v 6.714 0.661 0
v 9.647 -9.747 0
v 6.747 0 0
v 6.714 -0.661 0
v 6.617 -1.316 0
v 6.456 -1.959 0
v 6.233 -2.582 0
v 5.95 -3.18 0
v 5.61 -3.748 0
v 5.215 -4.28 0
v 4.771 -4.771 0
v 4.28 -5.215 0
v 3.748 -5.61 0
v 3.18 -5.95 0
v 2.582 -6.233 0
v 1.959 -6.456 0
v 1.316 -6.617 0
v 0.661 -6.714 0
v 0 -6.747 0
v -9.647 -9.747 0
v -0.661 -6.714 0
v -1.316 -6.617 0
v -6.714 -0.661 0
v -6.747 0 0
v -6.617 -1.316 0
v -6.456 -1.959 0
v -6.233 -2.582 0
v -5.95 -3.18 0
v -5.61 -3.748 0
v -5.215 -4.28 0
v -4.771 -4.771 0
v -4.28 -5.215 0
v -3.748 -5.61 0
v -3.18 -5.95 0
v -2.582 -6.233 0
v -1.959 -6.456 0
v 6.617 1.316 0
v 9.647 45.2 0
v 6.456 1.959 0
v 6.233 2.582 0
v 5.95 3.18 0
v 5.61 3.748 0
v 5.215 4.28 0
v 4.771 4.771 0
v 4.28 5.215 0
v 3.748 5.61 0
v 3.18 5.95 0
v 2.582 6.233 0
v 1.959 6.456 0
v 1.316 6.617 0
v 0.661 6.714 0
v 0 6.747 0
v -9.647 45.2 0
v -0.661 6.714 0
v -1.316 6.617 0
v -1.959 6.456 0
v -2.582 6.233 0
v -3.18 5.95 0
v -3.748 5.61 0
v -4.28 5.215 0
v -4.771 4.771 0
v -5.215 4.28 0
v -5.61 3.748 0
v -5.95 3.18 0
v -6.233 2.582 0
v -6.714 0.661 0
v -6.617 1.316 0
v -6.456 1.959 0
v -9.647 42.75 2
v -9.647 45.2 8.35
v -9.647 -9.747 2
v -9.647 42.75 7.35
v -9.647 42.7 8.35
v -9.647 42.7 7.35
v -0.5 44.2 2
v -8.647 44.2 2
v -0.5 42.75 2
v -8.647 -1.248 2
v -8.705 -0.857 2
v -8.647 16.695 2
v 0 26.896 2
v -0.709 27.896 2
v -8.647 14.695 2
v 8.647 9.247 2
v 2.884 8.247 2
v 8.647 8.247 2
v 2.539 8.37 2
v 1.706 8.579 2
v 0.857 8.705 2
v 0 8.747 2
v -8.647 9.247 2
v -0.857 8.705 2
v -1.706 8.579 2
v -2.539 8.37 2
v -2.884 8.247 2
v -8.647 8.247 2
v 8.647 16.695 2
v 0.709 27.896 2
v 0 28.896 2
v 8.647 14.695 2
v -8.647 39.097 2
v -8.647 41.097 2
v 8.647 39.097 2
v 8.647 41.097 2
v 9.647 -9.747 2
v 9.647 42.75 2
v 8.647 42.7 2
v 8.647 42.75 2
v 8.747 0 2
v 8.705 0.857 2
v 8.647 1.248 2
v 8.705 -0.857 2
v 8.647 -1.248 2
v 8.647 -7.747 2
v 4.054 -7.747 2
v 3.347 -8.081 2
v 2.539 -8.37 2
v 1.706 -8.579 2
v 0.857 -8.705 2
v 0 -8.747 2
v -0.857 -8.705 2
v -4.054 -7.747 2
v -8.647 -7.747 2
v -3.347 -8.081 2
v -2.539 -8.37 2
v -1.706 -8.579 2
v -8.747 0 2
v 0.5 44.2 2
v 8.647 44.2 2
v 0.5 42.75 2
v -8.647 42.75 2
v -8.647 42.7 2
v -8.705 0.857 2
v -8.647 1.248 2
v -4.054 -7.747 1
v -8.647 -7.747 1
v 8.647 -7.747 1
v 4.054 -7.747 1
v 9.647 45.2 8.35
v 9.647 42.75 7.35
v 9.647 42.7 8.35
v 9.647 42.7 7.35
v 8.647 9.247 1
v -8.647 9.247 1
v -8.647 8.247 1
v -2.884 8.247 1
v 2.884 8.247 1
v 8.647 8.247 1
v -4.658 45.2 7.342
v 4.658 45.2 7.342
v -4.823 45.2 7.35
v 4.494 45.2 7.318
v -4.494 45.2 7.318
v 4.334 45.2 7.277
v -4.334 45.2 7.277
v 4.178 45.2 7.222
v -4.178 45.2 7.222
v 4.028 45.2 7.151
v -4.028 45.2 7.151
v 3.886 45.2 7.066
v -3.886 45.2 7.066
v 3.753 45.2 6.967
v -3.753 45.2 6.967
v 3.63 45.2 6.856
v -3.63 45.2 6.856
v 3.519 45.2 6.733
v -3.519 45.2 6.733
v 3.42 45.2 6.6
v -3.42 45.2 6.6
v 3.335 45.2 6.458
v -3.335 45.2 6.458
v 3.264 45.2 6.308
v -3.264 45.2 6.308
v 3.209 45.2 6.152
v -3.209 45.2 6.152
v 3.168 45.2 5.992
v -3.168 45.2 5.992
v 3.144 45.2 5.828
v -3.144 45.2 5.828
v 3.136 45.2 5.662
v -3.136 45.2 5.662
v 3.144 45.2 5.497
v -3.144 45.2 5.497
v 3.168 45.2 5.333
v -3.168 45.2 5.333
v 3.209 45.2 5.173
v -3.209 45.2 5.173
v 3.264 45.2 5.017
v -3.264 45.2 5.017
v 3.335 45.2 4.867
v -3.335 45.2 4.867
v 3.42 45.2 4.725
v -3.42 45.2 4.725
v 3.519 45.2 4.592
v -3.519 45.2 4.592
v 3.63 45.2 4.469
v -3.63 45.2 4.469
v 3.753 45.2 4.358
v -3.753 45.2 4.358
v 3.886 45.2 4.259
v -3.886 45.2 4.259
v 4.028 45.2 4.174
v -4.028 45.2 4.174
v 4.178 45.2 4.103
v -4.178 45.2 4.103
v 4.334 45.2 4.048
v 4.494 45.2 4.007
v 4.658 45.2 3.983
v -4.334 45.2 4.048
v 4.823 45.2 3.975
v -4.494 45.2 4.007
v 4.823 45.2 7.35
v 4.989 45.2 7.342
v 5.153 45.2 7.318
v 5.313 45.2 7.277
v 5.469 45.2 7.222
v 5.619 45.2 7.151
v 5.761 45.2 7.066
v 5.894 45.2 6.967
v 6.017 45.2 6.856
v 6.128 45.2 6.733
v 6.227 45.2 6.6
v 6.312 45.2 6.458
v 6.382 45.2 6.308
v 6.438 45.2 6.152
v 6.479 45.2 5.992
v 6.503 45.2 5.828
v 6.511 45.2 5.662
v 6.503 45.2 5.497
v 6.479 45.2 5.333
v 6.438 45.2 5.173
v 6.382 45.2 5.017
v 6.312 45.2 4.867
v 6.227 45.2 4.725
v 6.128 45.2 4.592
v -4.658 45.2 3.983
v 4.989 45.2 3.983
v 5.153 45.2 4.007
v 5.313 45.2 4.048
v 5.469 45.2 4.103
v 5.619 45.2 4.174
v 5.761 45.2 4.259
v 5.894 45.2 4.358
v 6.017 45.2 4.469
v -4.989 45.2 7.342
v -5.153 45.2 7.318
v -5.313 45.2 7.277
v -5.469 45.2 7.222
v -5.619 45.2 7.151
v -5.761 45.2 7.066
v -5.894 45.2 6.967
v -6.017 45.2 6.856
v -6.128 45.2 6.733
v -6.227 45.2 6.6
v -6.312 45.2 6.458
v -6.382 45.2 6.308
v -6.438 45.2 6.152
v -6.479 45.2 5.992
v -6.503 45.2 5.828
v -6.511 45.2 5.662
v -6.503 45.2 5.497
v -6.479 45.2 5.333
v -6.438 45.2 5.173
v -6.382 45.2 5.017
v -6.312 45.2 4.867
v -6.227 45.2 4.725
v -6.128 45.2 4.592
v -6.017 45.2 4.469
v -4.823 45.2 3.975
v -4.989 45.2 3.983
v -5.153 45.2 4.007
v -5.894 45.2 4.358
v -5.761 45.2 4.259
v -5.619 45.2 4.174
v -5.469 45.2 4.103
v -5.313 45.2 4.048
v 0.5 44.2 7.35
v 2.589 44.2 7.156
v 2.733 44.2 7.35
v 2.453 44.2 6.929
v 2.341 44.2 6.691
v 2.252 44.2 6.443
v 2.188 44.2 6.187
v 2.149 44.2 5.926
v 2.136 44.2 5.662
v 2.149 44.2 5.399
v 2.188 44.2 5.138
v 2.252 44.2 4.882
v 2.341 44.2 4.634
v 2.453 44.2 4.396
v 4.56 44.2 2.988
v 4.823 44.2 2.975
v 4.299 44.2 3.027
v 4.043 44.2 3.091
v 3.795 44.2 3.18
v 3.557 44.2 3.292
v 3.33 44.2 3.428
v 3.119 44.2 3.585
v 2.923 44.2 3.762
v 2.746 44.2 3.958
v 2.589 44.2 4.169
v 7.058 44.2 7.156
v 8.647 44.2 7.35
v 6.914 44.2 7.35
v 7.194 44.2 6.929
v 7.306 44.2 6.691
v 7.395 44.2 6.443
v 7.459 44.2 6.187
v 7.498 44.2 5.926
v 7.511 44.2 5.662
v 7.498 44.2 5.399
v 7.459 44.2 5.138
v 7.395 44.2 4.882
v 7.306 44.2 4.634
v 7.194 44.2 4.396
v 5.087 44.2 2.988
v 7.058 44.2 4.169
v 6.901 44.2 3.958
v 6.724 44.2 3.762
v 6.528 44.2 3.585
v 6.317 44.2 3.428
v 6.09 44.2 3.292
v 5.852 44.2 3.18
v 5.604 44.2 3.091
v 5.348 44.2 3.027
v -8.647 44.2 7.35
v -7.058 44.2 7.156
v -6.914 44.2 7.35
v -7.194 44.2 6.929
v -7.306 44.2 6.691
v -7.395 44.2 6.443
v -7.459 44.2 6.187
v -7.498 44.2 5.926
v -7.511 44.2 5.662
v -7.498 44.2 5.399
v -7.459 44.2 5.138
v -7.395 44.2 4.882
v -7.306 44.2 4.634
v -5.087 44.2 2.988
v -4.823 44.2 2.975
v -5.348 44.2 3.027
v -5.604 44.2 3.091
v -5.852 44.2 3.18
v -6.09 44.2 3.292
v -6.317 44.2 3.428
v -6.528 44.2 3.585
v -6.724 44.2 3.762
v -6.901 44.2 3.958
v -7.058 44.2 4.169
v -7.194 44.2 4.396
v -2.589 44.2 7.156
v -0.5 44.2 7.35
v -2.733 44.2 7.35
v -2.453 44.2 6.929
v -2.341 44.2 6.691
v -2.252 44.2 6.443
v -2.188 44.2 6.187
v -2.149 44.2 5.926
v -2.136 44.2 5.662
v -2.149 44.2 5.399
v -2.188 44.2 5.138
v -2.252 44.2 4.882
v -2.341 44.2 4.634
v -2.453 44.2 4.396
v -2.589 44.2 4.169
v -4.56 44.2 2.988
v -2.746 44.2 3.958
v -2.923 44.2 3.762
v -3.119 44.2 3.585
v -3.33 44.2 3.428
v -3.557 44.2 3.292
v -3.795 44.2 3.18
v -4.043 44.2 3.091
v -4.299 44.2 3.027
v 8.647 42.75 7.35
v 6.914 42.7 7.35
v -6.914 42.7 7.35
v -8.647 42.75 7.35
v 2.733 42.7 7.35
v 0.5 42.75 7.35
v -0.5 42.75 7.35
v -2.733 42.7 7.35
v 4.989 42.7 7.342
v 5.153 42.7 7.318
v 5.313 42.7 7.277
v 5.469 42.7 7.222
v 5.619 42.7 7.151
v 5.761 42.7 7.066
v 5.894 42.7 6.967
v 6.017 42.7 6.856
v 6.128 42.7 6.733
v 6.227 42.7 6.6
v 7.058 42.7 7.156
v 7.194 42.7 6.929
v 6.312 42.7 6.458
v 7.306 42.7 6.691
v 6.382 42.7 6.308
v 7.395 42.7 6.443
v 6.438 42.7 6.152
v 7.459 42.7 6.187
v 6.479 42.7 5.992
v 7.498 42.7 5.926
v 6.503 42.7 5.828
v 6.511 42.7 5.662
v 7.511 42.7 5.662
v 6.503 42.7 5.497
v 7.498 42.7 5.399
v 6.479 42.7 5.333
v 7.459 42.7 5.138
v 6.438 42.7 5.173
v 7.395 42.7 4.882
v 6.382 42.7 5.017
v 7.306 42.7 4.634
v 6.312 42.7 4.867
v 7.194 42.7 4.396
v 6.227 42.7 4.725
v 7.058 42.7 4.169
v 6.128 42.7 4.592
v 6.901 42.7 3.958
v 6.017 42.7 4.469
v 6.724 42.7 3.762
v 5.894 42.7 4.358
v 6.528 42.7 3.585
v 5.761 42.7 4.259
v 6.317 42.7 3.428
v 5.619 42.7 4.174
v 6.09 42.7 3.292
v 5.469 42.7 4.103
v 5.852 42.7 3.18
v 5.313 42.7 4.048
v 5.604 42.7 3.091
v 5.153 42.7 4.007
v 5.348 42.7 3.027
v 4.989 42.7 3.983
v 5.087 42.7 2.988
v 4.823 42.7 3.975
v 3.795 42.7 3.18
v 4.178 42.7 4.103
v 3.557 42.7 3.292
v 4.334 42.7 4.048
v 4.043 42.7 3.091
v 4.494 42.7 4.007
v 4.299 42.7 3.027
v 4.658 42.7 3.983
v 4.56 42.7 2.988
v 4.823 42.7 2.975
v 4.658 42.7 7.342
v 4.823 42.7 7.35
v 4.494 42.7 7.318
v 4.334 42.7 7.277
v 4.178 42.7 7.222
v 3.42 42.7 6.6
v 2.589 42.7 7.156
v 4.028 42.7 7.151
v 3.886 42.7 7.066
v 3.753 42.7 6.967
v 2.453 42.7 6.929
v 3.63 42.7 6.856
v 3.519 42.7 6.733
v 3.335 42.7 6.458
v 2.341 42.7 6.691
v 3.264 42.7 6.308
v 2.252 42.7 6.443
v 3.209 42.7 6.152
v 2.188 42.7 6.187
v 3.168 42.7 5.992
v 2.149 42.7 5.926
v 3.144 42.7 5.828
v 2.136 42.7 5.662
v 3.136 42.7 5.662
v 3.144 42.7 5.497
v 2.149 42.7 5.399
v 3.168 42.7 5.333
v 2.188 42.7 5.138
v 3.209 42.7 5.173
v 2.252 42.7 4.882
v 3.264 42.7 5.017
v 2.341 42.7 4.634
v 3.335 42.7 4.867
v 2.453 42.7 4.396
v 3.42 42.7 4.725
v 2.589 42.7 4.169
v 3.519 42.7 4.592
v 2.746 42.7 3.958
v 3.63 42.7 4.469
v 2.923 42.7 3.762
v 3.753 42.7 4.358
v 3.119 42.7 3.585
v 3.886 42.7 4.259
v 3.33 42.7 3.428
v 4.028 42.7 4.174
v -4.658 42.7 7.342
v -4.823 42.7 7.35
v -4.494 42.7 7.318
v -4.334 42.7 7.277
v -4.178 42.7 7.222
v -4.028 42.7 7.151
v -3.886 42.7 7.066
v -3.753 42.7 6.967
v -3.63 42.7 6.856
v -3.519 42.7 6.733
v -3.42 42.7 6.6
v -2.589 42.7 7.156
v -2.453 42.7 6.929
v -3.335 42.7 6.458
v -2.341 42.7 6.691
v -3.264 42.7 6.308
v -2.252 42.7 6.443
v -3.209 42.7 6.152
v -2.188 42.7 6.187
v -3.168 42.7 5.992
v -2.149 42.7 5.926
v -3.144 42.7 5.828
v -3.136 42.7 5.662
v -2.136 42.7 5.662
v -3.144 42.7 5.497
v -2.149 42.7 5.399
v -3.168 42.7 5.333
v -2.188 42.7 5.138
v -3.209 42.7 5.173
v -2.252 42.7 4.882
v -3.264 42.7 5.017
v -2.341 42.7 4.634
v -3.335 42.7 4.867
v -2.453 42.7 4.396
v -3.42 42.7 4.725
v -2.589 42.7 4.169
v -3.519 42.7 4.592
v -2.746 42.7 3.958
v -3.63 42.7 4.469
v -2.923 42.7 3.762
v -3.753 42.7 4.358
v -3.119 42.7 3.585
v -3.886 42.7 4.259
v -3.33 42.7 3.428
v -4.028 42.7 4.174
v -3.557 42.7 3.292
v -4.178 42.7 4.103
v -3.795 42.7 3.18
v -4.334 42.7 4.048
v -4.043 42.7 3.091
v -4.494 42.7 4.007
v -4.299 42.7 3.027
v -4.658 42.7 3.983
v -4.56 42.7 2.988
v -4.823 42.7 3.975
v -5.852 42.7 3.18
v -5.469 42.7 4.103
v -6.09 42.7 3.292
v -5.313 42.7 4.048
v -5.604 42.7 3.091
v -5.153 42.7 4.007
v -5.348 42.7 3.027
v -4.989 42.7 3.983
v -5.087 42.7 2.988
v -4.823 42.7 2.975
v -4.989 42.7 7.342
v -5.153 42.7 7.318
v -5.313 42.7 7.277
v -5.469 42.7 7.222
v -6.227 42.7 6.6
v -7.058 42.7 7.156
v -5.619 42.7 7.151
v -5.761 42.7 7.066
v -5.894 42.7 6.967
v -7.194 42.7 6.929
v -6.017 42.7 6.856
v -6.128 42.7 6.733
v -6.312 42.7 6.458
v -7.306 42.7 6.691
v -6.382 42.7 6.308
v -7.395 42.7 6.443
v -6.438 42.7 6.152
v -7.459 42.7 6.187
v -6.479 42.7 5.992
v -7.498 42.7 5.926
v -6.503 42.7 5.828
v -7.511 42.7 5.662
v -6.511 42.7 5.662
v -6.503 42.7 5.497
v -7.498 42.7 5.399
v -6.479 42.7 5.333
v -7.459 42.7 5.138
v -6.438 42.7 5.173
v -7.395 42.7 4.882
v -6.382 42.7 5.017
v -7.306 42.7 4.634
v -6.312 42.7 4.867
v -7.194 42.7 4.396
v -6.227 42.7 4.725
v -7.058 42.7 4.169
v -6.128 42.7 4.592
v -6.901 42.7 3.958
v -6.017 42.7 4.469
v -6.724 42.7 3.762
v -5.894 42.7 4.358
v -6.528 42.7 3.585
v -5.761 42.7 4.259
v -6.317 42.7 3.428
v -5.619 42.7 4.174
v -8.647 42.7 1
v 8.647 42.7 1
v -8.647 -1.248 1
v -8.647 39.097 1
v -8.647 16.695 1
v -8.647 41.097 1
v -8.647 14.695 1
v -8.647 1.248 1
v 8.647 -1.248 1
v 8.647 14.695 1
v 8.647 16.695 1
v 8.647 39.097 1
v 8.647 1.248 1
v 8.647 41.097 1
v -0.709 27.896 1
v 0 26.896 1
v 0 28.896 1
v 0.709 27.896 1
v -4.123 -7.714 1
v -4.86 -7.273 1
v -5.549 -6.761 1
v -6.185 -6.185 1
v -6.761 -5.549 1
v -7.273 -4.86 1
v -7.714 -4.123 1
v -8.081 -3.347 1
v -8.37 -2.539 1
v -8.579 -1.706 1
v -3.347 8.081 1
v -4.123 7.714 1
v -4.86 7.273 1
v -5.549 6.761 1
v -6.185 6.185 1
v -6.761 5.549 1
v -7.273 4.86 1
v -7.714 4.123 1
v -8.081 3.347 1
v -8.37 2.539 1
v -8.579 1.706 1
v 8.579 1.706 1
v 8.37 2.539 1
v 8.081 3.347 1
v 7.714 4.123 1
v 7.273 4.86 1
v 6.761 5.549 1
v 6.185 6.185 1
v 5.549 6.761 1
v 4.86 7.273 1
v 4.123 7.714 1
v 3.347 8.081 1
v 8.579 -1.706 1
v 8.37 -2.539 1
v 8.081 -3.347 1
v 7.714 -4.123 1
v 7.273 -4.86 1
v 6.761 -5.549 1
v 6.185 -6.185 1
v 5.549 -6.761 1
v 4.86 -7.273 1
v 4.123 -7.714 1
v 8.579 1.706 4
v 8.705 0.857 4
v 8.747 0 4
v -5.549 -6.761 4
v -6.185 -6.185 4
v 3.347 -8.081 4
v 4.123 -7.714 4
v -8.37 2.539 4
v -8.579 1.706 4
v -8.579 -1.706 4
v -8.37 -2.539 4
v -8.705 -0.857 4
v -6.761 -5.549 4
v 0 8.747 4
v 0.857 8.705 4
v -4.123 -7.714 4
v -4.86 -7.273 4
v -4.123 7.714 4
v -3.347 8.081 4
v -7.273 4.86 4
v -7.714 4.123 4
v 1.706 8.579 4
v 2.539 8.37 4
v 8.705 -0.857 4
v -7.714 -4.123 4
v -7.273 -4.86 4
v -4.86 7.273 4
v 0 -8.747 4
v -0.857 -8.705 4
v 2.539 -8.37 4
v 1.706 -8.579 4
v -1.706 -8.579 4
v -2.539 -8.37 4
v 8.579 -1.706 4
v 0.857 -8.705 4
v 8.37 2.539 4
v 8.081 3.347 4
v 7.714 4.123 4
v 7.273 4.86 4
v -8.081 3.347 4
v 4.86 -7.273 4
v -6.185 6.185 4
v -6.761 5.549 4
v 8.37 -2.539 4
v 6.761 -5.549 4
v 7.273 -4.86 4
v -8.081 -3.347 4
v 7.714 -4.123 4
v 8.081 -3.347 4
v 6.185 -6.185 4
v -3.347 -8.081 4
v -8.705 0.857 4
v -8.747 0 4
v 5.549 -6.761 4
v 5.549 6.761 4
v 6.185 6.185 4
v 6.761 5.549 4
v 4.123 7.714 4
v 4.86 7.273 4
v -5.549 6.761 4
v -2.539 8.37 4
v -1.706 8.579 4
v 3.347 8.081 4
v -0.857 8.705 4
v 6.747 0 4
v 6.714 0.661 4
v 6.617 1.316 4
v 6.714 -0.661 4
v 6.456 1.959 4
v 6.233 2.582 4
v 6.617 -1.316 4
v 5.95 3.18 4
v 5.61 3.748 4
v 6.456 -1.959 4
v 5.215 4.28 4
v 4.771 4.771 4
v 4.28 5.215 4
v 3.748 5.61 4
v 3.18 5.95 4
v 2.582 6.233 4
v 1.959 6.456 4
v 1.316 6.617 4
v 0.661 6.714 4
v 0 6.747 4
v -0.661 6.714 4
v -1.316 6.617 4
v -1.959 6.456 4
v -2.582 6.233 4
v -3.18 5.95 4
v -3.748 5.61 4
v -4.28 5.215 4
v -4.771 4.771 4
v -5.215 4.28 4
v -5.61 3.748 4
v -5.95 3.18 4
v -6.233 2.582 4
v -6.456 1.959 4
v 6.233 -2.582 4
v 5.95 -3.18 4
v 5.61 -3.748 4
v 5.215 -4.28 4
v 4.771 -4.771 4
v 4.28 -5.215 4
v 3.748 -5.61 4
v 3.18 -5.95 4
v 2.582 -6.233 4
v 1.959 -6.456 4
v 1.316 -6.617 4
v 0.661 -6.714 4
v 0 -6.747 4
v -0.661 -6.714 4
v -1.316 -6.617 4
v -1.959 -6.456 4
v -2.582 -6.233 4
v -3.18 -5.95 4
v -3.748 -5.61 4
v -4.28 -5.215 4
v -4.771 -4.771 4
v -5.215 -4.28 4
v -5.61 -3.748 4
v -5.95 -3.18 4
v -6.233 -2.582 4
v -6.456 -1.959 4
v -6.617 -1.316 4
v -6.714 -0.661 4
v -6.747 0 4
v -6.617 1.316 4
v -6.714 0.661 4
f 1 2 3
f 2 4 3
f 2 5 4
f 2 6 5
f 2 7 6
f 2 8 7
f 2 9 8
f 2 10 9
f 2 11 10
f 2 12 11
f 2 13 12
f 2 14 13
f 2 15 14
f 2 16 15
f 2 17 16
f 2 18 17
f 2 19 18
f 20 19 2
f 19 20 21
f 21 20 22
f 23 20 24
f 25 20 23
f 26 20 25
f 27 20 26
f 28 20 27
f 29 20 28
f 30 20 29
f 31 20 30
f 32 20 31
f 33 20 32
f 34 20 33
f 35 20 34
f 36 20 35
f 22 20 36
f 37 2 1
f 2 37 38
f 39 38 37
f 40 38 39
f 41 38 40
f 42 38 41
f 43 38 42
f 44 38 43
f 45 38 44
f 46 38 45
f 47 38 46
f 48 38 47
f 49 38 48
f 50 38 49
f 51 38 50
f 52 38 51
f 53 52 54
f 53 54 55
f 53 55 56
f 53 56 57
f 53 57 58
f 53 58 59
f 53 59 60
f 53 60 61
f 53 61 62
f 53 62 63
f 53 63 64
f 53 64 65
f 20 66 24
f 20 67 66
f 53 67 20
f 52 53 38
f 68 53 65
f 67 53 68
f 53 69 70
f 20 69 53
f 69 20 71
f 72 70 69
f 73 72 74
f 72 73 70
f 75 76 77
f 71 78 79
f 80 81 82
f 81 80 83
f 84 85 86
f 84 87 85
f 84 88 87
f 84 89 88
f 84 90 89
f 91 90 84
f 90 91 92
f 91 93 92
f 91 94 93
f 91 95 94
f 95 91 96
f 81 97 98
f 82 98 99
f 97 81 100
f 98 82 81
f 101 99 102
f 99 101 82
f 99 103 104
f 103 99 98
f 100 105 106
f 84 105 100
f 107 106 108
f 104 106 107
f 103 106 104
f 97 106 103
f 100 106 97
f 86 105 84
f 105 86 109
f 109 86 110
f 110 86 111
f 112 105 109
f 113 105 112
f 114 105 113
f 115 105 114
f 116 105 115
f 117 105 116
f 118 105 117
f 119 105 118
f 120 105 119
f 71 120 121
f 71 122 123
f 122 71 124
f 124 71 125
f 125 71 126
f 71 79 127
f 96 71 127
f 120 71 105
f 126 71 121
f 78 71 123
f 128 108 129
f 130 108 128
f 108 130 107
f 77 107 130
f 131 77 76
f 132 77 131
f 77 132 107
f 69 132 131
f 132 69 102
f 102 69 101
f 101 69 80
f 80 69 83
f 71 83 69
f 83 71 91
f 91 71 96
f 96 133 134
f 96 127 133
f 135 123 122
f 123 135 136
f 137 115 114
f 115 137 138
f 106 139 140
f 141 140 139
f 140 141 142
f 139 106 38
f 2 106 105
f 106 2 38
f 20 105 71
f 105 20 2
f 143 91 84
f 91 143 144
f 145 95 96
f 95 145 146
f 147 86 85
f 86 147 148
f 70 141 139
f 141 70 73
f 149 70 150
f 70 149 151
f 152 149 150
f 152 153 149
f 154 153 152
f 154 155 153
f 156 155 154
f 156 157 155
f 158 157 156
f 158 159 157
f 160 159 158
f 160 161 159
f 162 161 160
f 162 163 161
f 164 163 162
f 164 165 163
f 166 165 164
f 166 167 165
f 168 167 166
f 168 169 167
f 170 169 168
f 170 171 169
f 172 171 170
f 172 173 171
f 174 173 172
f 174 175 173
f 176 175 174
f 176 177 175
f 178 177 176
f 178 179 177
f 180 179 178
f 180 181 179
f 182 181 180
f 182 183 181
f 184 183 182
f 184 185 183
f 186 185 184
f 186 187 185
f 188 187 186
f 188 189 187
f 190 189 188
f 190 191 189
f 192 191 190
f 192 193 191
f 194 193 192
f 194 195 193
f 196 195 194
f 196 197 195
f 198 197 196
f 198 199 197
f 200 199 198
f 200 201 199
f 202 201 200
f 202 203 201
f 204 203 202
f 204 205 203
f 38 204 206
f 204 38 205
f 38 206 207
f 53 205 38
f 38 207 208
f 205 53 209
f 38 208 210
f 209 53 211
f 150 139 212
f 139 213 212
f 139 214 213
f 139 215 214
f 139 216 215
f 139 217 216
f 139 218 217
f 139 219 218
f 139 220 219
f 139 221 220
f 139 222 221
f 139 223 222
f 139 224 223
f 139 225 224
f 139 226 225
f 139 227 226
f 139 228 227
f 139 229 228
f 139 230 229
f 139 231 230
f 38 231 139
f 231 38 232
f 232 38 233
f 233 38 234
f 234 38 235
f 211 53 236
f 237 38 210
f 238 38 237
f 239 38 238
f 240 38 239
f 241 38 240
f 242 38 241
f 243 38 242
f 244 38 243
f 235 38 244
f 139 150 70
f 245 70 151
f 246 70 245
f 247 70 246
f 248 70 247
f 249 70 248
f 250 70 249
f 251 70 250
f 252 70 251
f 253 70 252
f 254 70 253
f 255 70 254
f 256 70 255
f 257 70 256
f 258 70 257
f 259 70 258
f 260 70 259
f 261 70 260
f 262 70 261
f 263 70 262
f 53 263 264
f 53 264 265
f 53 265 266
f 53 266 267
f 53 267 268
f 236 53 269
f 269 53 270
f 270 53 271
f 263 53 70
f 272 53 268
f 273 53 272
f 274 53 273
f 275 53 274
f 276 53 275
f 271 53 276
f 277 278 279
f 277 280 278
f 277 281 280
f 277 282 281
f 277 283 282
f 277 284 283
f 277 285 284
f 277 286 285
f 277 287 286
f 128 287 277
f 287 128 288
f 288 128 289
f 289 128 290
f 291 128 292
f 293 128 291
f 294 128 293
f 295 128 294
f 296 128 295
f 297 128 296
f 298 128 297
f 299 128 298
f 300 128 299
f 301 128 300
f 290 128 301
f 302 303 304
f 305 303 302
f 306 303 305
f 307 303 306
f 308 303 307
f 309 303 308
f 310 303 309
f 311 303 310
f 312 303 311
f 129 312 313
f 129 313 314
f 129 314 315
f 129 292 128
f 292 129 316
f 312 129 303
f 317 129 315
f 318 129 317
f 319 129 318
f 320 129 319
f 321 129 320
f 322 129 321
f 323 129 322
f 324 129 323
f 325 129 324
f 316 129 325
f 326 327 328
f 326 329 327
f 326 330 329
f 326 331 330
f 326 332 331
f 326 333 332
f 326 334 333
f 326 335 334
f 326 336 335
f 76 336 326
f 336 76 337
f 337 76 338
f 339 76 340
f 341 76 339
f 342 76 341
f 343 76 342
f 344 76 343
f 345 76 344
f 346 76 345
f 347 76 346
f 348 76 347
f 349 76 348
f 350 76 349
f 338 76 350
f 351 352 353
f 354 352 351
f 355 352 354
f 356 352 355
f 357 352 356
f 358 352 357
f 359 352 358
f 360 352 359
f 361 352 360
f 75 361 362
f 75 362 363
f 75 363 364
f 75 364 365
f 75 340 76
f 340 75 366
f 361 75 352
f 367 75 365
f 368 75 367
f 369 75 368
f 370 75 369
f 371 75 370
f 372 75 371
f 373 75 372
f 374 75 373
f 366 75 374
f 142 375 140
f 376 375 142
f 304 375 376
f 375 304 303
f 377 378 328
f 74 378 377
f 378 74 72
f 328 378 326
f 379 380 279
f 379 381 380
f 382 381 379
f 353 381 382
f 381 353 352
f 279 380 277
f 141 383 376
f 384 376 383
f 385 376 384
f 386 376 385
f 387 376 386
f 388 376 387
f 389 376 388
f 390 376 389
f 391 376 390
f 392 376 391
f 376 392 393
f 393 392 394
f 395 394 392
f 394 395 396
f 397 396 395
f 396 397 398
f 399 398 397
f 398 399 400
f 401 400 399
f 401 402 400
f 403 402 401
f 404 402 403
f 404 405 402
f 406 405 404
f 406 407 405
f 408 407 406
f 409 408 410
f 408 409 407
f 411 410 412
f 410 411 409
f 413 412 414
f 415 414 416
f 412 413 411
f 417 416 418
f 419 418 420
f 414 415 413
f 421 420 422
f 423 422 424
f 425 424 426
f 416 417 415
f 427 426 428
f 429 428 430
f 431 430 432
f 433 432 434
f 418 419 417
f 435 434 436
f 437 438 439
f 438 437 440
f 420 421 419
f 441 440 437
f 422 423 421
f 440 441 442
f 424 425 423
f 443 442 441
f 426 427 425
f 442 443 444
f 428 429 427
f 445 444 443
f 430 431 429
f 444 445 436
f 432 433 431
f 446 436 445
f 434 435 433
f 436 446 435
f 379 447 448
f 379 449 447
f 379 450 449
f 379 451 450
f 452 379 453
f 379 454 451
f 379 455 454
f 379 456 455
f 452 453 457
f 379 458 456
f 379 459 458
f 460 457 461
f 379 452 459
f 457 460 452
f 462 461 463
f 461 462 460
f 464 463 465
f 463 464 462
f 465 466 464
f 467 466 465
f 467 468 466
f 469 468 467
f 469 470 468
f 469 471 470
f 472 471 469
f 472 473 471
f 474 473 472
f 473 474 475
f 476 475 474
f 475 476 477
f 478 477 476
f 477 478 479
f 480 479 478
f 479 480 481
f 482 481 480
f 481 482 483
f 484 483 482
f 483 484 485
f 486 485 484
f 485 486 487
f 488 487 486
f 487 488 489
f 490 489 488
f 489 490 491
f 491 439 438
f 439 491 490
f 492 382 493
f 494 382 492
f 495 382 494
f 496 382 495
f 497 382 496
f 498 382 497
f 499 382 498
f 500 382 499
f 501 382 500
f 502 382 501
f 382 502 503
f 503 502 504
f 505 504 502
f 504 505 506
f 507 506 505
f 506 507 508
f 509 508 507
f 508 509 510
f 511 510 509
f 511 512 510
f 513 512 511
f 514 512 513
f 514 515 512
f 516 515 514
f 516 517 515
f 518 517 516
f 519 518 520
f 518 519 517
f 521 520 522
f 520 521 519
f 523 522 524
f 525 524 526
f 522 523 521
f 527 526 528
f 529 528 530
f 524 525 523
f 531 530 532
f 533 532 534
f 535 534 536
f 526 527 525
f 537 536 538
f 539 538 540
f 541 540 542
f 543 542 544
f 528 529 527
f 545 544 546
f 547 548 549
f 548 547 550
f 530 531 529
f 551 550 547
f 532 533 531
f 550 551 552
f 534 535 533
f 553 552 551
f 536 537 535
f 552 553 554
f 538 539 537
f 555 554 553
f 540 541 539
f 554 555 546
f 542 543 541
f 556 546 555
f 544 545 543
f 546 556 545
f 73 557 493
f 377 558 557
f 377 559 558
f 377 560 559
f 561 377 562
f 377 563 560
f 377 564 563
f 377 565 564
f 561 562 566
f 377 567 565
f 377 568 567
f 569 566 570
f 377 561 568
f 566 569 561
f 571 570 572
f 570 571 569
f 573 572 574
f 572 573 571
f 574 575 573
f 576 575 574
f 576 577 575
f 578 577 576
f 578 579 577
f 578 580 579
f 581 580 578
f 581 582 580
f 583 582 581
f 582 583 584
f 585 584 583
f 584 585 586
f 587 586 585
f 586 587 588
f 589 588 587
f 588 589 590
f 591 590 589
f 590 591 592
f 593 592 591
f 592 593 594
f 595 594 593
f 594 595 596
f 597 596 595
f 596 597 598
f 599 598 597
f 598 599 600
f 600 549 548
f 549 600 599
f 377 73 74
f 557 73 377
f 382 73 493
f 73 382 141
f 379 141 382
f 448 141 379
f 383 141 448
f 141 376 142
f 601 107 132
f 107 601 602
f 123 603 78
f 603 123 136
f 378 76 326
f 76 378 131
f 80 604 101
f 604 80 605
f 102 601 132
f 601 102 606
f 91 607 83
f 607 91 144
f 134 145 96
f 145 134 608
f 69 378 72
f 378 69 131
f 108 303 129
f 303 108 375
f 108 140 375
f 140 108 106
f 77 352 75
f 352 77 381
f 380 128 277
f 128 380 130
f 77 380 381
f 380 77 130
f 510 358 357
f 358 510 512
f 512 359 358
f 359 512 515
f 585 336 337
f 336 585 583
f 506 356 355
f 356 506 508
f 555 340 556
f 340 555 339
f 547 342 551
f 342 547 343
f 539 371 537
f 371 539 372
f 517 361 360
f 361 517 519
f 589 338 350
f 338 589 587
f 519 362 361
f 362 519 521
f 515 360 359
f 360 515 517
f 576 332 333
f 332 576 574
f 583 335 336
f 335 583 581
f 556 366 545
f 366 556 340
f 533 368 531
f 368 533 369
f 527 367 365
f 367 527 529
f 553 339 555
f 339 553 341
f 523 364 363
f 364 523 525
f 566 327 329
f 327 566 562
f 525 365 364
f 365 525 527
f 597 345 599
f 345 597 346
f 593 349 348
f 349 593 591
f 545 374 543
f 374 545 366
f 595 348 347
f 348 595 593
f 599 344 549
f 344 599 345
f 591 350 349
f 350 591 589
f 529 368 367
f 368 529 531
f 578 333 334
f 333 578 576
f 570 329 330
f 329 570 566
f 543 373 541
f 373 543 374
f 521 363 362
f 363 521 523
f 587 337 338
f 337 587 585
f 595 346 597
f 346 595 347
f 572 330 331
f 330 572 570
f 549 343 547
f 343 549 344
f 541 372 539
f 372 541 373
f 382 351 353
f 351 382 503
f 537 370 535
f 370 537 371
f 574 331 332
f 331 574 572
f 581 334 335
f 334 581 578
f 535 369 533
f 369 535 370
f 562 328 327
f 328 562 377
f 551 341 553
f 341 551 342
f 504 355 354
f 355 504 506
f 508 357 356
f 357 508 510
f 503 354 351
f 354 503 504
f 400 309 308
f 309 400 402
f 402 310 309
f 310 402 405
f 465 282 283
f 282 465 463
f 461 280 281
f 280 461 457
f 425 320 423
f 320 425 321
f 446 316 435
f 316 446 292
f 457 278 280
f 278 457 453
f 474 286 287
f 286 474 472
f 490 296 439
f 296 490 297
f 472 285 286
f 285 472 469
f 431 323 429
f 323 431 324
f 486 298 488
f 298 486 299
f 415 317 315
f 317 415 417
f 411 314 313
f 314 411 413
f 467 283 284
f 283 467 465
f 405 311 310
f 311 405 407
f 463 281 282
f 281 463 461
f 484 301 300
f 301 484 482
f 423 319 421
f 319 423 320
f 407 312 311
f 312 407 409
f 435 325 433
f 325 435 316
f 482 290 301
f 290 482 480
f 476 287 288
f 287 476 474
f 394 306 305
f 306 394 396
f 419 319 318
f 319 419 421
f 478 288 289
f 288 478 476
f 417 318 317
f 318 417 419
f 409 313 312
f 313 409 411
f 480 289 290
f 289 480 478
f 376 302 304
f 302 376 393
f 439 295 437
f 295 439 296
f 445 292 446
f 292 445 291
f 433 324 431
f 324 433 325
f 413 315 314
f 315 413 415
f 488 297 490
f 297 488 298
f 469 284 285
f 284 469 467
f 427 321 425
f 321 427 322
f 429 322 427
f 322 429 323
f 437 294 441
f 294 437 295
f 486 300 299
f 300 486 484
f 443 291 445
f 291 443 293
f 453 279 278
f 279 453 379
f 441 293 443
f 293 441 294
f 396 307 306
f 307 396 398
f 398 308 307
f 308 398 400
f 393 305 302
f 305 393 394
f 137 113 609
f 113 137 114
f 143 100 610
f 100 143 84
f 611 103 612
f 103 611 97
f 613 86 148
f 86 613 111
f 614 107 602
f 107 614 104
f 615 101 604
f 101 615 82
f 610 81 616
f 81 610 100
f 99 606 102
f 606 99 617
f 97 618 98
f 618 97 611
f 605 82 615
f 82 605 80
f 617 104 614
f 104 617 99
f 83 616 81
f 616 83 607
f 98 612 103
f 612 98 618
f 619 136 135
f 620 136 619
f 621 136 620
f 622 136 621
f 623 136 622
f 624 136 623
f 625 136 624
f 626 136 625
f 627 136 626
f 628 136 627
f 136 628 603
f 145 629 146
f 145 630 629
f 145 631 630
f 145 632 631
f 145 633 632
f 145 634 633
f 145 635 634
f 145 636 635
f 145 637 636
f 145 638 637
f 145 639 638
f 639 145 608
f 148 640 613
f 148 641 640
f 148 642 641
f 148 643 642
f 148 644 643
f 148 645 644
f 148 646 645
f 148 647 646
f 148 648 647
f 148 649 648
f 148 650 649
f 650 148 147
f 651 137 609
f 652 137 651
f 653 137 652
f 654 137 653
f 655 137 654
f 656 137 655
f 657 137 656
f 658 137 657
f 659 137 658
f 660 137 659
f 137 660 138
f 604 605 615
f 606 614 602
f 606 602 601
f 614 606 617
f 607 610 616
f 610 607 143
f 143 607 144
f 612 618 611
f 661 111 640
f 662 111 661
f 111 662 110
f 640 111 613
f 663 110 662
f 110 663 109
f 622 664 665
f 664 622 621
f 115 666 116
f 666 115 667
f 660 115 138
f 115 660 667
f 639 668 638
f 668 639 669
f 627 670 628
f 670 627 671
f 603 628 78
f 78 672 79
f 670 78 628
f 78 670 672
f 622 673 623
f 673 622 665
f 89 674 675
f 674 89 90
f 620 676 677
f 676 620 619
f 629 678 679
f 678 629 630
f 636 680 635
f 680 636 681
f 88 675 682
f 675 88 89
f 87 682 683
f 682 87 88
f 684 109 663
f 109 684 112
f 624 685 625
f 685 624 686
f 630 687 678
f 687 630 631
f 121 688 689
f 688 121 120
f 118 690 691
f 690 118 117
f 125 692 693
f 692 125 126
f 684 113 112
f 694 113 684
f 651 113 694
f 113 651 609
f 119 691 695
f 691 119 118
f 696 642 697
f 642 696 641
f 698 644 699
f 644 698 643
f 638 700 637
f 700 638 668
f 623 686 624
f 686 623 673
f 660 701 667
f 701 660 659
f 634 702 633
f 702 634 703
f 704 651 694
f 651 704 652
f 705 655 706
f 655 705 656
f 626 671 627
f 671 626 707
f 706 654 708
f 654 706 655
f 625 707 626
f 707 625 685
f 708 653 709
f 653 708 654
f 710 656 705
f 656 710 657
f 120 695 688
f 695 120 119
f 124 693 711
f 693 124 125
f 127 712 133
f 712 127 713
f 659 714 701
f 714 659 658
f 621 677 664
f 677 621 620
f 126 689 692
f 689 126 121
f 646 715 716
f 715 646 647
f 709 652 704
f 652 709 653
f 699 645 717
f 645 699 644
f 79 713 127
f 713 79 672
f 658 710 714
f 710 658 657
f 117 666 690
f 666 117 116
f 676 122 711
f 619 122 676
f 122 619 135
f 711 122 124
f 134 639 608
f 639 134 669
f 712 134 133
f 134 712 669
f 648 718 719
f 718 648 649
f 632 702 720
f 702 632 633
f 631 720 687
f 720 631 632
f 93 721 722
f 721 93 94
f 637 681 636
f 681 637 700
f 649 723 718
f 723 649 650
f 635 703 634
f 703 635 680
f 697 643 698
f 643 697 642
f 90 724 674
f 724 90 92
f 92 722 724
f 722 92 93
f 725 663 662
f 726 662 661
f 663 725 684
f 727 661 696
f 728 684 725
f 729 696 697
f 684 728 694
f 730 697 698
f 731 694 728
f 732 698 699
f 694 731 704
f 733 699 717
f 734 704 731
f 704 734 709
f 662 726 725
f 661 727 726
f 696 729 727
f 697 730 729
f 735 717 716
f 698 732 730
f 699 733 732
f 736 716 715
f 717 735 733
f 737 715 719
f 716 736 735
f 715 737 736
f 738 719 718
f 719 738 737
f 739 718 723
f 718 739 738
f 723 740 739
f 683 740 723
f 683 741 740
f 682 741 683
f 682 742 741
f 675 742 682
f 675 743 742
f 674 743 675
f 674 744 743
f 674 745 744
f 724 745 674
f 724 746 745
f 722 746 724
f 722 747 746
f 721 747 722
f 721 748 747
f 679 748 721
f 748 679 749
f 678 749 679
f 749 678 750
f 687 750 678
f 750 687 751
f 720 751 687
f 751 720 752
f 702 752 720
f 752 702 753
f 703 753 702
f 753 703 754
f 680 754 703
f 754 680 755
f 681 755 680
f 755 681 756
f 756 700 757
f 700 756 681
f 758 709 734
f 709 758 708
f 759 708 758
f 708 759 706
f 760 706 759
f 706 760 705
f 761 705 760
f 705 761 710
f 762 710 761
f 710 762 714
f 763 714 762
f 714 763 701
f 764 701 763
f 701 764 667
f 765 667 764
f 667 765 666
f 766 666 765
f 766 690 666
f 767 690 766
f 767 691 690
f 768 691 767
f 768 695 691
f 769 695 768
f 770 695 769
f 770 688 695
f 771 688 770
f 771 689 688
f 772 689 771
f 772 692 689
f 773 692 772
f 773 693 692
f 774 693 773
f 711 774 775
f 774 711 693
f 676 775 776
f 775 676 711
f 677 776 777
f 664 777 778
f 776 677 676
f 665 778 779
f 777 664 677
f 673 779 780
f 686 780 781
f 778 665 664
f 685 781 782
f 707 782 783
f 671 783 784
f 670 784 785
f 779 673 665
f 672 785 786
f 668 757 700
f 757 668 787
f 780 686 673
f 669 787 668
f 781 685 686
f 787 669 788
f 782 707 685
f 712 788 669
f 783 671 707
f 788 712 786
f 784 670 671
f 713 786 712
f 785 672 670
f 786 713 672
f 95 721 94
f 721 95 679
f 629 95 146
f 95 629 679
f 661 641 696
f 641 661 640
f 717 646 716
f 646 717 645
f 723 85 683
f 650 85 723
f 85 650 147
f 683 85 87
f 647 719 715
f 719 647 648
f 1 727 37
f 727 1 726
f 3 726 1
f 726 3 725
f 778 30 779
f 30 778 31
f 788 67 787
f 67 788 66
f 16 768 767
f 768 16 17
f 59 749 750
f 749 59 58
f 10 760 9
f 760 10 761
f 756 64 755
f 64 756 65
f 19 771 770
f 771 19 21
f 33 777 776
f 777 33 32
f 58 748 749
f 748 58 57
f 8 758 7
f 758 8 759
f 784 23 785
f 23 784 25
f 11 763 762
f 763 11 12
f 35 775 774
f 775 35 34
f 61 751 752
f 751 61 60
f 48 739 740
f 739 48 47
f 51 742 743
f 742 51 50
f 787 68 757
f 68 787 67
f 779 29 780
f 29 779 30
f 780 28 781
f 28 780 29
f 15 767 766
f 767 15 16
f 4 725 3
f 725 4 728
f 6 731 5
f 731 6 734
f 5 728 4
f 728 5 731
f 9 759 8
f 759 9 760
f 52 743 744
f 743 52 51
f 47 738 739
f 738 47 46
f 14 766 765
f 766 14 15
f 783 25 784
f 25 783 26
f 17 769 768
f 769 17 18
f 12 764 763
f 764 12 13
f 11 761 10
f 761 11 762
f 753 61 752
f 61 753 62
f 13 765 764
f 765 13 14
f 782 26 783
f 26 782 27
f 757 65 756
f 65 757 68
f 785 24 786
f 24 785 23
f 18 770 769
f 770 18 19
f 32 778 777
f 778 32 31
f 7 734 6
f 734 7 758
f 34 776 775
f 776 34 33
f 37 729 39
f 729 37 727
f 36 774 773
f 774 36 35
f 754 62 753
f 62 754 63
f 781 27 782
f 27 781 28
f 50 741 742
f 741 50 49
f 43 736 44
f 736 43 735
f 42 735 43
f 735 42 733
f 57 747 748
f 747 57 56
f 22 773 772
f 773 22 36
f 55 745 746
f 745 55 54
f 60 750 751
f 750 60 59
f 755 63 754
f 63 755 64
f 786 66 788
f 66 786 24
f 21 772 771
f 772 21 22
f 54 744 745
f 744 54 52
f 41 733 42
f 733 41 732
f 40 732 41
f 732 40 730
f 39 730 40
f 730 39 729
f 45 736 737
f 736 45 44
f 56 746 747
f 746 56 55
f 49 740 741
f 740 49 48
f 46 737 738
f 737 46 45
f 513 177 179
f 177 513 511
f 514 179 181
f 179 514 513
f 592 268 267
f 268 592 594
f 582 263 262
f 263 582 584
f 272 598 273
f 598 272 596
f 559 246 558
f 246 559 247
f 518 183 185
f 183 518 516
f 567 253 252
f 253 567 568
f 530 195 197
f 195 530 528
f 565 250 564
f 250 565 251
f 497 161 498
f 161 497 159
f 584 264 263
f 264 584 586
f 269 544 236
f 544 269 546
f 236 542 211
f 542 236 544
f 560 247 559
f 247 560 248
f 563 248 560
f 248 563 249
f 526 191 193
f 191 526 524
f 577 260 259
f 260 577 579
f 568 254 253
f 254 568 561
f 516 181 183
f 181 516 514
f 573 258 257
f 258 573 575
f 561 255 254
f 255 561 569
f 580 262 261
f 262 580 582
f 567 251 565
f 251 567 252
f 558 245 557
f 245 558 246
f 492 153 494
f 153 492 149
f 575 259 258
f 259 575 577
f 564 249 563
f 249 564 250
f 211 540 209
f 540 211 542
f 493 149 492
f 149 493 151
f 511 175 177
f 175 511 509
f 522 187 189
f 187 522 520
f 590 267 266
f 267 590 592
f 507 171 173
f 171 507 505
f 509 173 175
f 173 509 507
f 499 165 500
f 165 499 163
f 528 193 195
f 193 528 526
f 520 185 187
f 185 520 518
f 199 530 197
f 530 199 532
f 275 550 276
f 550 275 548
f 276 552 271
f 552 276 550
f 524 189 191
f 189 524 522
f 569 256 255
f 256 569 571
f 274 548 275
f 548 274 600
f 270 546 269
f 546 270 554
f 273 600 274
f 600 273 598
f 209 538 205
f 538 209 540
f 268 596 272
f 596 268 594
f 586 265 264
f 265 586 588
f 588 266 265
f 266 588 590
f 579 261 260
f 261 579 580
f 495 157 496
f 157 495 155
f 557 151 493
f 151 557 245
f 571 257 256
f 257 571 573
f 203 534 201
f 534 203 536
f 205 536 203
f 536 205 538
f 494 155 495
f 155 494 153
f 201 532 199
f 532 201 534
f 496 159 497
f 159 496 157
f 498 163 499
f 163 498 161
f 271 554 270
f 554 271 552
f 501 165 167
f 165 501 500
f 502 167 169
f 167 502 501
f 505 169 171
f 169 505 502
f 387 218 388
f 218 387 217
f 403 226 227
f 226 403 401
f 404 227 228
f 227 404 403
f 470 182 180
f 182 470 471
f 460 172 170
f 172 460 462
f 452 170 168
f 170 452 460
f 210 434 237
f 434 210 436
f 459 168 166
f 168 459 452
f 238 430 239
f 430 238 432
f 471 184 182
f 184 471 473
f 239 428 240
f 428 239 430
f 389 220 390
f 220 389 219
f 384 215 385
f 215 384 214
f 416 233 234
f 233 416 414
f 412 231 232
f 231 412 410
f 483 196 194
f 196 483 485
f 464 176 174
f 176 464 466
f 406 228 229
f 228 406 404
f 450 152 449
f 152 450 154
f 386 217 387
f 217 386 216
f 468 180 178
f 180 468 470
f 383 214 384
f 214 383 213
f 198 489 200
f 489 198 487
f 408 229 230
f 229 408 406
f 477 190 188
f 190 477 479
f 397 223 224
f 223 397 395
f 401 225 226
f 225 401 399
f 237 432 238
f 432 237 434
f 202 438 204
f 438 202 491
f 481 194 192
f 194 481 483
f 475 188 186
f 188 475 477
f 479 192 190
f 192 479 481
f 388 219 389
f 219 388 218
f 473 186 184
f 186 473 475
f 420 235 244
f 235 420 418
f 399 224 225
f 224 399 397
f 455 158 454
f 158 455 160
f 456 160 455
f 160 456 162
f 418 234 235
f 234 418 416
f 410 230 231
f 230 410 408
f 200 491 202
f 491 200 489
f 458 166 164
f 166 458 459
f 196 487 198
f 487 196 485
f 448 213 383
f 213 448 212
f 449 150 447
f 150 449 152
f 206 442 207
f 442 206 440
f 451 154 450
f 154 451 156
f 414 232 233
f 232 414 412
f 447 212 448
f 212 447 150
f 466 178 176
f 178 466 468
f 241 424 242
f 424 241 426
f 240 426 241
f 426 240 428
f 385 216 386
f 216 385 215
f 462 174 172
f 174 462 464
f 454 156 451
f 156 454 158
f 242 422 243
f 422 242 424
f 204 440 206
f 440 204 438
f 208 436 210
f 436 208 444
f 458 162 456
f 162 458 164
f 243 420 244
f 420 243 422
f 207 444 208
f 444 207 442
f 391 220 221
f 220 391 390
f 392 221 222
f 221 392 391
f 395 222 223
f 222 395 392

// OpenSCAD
// hand crank stand for coil winder
// need 2 of these

$sd = 25.4/2    // 1/2 inch diameter shaft
    + 25.4/32;  // add 1/32 inch clearance
                       
$th = 2;      // 2mm thickness of braces
$th2 = 1;     // 1mm thickness of 'filler'

$wd = 70;     // 70mm diameter wheel
$hh = $wd/2+$sd/2+25.4/2; // height of 'square' part
$ww = ($sd+$th*2)+$th2*1.8;

$bh = 25.4 / 4; // 1/4" base height

$dd = 25.4/8+0.2; // 1/8 inch diameter hole
//$of = $dd+$wt;    // offset from edge


$fn = 64; // 64 faces on polygons

union()
{
  difference()
  {
    union()
    {
      color("green")
        translate([0,($hh-($sd+$th*2))/2-$th2,0])
          linear_extrude(height=$th2)
            square([$ww,$hh],true);

      color("orange")
        union()
        {
          // lateral braces
          translate([0,-($sd+$th*2)/2,$th2-1])
            linear_extrude(height=$th2+1)
              square([$ww,$th],true);

          translate([0,($sd+$th*2)/2,$th2-1])
            linear_extrude(height=$th2+1)
              square([$ww,$th2],true);

          // base
          translate([0,$hh-$th2-($sd+$th*2)/2,
                     $th2-1])
            linear_extrude(height=$th2+1+$bh)
              square([$ww,$th2],true);

          translate([0,
                     $hh-$th2*2-($sd+$th*2)/2,
                     $th2+$bh])
            linear_extrude(height=$th2)
              square([$ww,$th2*2],true);

          translate([0,
                     $hh-$th2*2-($sd+$th*2)/2,
                     $th2-1])
            linear_extrude(height=$th2+1)
              square([$ww,$th2*2],true);

          translate([-$ww/2+$th2/2,
                     $hh-$th2*2-($sd+$th*2)/2,
                     $th2-1])
            linear_extrude(height=$th2+1+$bh)
              square([$th2,$th2*2-0.1],true);

          translate([$ww/2-$th2/2,
                     $hh-$th2*2-($sd+$th*2)/2,
                     $th2-1])
            linear_extrude(height=$th2+1+$bh)
              square([$th2,$th2*2-0.1],true);

          // center base brace
          translate([0,
                     $hh-$th2*2-($sd+$th*2)/2,
                     $th2-1])
            linear_extrude(height=$th2+1+$bh)
              square([$th2,$th2*2-0.1],true);

          // mounting screw holes
          translate([-$ww/4,
                     $hh-$th2-($sd+$th*2)/2,
                     $th2-1])
            rotate([90,0,0])
              translate([0,$bh-$dd/2+$th2,0])
                linear_extrude(height=$th2*2)
                  circle(d=$dd+$th);

          translate([$ww/4,
                     $hh-$th2-($sd+$th*2)/2,
                     $th2-1])
            rotate([90,0,0])
              translate([0,$bh-$dd/2+$th2,0])
                linear_extrude(height=$th2*2)
                  circle(d=$dd+$th);

          // longitudinal braces
          translate([-$ww/2+$th2/2,
                     -($sd+$th*2-$hh)/2
                       -$th2/2,
                     $th2-1])
            linear_extrude(height=$th2+1)
              square([$th2,$hh-$th2],true);

          translate([$ww/2-$th2/2,
                    -($sd+$th*2-$hh)/2
                      -$th2/2,
                    $th2-1])
            linear_extrude(height=$th2+1)
              square([$th2,$hh-$th2],true);

          // diagonal braces
          translate([0,($sd+$th*2)/2+$hh/12,
                     $th2-1])
            linear_extrude(height=$th2+1)
              polygon([[$ww/2,0],[$ww/2,$th2*2],
                       [-$ww/2,$hh/2+$th2*2],
                       [-$ww/2,$hh/2]]);

          translate([0,($sd+$th*2)/2+$hh/12,
                     $th2-1])
            linear_extrude(height=$th2+1)
              polygon([[-$ww/2,0],
                       [-$ww/2,$th2*2],
                       [$ww/2,$hh/2+$th2*2],
                       [$ww/2,$hh/2]]);
 
          

        }

      color("blue")
        linear_extrude(height=$th*2)
          circle(d=($sd+$th*2));
    }

    color("yellow")
      translate([0,0,-1])
        linear_extrude(height=$th*2+2)
          circle(d=$sd);

          // mounting screw holes
    color("yellow")
          translate([-$ww/4,
                     $hh-$th2-($sd+$th*2)/2+1,
                     $th2-1])
            rotate([90,0,0])
              translate([0,$bh-$dd/2+$th2,0])
                linear_extrude(height=$th2*2+2)
                  circle(d=$dd);

    color("yellow")
          translate([$ww/4,
                     $hh-$th2-($sd+$th*2)/2+1,
                     $th2-1])
            rotate([90,0,0])
              translate([0,$bh-$dd/2+$th2,0])
                linear_extrude(height=$th2*2+2)
                  circle(d=$dd);
  }

  // base

  

}
